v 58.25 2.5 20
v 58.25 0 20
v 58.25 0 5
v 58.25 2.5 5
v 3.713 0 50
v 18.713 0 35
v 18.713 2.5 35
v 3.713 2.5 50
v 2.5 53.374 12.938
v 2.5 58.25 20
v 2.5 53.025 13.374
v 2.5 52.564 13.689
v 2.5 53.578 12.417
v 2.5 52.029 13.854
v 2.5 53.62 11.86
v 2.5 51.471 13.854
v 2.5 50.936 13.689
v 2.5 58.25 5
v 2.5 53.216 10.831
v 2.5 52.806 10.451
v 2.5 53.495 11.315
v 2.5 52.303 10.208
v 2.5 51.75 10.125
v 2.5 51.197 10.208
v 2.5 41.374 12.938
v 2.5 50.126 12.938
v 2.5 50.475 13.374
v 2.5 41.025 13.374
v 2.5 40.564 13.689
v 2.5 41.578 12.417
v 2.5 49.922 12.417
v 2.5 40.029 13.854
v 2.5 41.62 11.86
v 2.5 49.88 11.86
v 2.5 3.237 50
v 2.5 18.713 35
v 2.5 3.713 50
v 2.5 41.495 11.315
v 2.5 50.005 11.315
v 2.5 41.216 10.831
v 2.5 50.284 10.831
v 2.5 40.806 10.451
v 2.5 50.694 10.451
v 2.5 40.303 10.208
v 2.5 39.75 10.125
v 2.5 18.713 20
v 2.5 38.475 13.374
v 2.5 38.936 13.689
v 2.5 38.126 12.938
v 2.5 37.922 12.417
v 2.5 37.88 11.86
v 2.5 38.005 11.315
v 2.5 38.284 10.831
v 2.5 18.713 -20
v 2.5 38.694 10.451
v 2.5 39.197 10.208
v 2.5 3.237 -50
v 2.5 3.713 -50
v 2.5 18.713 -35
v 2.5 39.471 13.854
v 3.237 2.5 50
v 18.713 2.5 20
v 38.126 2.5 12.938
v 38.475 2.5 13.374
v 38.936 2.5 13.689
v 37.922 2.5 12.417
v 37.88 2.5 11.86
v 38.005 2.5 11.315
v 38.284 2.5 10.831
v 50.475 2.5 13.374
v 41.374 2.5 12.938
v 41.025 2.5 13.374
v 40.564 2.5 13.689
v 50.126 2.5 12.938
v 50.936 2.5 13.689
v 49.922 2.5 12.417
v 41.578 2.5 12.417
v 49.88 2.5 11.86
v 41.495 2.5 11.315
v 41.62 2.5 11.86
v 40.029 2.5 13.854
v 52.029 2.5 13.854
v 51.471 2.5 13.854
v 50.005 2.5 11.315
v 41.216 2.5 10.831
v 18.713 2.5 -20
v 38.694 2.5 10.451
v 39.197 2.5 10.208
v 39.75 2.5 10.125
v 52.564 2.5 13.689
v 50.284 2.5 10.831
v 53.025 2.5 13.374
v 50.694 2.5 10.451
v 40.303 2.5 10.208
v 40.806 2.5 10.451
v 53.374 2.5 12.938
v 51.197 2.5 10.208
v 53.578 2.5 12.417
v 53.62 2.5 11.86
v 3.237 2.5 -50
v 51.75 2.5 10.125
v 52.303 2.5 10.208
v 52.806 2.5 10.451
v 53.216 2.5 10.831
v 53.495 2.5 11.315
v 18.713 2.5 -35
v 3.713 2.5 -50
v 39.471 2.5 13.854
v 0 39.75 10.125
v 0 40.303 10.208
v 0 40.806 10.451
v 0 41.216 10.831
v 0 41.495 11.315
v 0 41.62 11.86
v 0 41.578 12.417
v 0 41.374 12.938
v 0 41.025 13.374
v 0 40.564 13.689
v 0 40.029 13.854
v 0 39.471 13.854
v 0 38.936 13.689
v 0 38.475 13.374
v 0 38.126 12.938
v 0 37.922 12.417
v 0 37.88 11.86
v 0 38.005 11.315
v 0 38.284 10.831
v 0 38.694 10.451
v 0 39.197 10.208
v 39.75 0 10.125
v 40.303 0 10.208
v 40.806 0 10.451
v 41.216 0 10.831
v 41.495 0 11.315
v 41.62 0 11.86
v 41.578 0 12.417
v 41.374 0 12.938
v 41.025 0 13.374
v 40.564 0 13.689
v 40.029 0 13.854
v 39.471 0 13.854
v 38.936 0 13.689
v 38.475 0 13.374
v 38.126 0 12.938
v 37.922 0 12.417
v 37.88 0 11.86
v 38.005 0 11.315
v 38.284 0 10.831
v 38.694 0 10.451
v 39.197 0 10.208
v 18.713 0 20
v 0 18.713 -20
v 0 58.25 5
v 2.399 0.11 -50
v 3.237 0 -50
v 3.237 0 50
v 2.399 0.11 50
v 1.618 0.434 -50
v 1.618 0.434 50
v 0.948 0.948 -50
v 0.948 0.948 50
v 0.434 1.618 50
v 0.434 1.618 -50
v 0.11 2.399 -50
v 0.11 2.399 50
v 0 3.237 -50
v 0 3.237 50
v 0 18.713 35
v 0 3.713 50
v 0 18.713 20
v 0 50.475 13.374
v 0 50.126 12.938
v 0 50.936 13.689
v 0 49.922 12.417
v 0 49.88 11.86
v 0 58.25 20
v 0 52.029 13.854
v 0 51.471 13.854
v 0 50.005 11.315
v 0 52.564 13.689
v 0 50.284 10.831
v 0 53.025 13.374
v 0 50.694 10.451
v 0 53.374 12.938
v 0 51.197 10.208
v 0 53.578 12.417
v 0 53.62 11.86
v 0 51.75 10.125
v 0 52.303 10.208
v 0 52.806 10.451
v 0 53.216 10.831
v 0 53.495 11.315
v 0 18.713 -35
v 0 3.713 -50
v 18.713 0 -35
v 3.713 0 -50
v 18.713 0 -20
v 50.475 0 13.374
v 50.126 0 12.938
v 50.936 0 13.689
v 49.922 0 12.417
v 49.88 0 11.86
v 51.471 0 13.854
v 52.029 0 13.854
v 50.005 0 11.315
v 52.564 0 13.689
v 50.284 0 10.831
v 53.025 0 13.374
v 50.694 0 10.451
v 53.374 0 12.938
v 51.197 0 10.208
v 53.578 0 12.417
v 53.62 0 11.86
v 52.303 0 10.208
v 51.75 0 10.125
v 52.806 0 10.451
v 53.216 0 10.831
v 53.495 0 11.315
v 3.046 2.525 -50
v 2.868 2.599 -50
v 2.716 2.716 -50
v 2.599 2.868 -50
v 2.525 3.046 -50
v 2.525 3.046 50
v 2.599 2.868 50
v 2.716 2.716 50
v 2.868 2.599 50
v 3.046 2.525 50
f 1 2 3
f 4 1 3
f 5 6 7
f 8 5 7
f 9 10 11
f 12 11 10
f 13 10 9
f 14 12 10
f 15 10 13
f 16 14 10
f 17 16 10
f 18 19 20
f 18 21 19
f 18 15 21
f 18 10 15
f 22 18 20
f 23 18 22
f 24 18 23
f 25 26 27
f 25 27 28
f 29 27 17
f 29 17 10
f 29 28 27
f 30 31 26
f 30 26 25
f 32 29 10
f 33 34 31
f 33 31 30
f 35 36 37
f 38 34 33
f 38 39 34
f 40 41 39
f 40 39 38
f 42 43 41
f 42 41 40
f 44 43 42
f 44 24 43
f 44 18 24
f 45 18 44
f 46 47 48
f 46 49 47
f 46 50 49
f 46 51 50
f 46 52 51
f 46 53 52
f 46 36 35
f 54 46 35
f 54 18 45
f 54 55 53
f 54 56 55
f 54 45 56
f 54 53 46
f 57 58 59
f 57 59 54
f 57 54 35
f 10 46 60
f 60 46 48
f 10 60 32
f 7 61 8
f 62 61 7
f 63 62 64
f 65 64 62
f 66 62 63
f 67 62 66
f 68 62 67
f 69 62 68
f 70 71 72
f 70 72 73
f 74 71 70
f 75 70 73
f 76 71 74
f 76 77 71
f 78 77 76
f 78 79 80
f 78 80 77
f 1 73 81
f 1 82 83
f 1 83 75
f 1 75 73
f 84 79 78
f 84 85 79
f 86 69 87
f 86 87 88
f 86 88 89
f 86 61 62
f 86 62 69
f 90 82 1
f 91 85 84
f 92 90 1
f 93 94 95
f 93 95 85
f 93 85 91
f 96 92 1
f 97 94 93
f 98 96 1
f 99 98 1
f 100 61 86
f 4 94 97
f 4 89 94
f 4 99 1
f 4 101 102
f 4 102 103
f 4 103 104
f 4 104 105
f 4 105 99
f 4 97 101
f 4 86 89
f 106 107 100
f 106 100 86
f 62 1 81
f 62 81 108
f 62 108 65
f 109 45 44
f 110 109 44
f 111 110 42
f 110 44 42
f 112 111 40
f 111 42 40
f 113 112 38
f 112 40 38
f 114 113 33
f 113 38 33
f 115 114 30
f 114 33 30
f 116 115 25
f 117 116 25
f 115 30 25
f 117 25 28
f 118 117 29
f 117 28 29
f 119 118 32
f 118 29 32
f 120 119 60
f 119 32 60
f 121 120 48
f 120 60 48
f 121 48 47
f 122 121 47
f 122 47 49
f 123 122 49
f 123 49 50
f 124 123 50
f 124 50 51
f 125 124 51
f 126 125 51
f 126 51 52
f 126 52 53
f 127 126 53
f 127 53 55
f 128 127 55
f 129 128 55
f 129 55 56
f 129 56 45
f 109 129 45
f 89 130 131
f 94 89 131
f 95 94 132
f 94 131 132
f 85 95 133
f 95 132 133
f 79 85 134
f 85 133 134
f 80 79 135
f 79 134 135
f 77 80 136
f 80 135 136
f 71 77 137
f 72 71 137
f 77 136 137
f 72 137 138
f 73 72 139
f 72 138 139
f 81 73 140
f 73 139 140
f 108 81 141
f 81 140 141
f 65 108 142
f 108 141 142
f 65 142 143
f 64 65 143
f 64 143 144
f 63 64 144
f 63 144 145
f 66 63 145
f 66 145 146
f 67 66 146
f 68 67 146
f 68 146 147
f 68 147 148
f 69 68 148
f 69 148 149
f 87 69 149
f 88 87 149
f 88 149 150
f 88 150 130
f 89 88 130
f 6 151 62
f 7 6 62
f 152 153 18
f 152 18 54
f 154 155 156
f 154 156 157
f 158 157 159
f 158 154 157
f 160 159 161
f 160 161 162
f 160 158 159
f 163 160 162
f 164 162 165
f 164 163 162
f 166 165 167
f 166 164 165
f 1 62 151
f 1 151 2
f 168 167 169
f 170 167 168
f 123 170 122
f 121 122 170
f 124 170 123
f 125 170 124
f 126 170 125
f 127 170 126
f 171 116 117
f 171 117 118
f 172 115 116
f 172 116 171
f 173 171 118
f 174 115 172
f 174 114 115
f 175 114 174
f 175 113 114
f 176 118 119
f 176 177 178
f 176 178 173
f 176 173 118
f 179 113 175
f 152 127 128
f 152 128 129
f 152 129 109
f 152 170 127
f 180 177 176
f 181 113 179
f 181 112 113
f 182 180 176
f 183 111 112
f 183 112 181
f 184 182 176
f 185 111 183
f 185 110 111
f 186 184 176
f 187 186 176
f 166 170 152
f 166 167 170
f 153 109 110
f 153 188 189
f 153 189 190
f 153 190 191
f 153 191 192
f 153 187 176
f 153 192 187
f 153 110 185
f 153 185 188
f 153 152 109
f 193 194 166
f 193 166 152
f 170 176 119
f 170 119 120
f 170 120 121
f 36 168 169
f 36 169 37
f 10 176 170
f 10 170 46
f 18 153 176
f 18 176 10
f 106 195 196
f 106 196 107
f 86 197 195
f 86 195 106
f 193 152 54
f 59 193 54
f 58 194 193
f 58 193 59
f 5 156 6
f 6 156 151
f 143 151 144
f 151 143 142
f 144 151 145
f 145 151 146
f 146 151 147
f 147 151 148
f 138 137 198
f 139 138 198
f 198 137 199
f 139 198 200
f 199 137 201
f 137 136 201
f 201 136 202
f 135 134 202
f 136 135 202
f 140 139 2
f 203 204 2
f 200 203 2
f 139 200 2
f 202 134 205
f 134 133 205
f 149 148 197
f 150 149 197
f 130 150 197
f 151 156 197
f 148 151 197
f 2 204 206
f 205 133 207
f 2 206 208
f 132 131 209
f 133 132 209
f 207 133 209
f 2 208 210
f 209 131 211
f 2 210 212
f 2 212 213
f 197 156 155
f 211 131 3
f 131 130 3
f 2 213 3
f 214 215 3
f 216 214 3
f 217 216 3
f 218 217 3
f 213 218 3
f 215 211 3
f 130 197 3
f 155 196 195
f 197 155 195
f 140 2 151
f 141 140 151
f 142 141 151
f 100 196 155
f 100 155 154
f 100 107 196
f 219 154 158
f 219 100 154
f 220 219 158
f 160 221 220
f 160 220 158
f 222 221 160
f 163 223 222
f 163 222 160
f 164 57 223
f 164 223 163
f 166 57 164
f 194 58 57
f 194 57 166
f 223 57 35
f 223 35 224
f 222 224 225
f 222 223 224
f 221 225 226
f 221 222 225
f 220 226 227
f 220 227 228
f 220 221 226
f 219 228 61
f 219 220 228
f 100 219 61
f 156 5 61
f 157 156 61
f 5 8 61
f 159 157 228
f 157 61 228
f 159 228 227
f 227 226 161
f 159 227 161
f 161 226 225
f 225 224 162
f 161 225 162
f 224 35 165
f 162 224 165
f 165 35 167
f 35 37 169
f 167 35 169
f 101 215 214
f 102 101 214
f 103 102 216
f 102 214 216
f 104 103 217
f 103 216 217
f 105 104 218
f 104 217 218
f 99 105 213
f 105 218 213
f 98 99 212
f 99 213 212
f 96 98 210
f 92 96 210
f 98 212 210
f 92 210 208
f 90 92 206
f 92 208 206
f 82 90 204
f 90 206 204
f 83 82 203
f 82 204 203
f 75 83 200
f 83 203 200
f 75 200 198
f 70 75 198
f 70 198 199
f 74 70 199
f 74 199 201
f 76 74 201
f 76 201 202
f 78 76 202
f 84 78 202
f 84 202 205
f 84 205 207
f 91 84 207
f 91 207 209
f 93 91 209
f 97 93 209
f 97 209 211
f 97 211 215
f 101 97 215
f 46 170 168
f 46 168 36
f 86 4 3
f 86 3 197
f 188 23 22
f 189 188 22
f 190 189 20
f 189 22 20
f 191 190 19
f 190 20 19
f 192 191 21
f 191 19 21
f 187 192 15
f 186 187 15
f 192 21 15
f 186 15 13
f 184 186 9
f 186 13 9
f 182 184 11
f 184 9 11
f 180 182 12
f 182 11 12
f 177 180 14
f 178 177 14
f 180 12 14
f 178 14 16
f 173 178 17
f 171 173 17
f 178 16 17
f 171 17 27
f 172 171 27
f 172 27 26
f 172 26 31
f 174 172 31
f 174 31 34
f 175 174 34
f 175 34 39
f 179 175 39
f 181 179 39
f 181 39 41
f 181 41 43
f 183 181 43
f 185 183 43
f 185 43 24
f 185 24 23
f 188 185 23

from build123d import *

# Parameters (mm, degrees)
SKETCH1_W                    = 58.25
SKETCH1_H                    = 100
BASE_FLANGE1_DEPTH           = 2.5
EDGE_FLANGE1_STRIP_W         = 11.4732
EDGE_FLANGE1_STRIP_H         = 2.5
EDGE_FLANGE1_STRIP_CUT_DEPTH = 100
EDGE_FLANGE1_DEPTH           = 100
CUT_EXTRUDE1_START           = -30
CUT_EXTRUDE1_OUTLINE_W       = 2.5
CUT_EXTRUDE1_OUTLINE_H       = 39.536796564
CUT_EXTRUDE1_OUTLINE_W_2     = 39.536796564
CUT_EXTRUDE1_OUTLINE_H_2     = 2.5
CUT_EXTRUDE1_DEPTH           = 30
CUT_EXTRUDE2_REACH           = 98.365
SKETCH21_R                   = 1.875
CIRPATTERN1_COUNT            = 2
CIRPATTERN1_ANGLE            = 90
CUT_EXTRUDE3_REACH           = 98.365
CIRPATTERN2_COUNT            = 2
CIRPATTERN2_ANGLE            = 90
CHAMFER1_SIZE                = 15


# Read off the part's stored shape, not the designer's step: Cut-Extrude1
# Sheet-metal steps are written as plain solids
with BuildPart() as part:
    # Sketch1 → Base-Flange1 (new body)
    with BuildSketch(Plane(origin=(0, 0, 0), x_dir=(1, 0, 0), z_dir=(0, 1, 0))):
        with Locations((29.125, 0)):
            Rectangle(SKETCH1_W, SKETCH1_H)
    extrude(amount=BASE_FLANGE1_DEPTH)

    # Edge-Flange1 strip (across the edge) → Edge-Flange1 strip cut (cut)
    with BuildSketch(Plane(origin=(0, 2.5, -50), x_dir=(1, 0, 0), z_dir=(0, 0, 1))):
        with Locations((-2.5, -1.25)):
            Rectangle(EDGE_FLANGE1_STRIP_W, EDGE_FLANGE1_STRIP_H)
    extrude(amount=EDGE_FLANGE1_STRIP_CUT_DEPTH, mode=Mode.SUBTRACT)

    # Edge-Flange1 section (across the edge) → Edge-Flange1 (add)
    with BuildSketch(Plane(origin=(0, 2.5, -50), x_dir=(1, 0, 0), z_dir=(0, 0, 1))):
        with BuildLine():
            Line((0, 0.7366), (0, 55.75))
            Line((0, 55.75), (2.5, 55.75))
            Line((2.5, 55.75), (2.5, 0.7366))
            ThreePointArc((2.5, 0.7366), (2.715745145, 0.215745145), (3.2366, 0))
            Line((3.2366, 0), (3.2366, -2.5))
            ThreePointArc((3.2366, -2.5), (0.947978192, -1.552021808), (0, 0.7366))
        make_face()
    extrude(amount=EDGE_FLANGE1_DEPTH)

    # Cut-Extrude1 outline → Cut-Extrude1 (cut)
    with BuildSketch(Plane.XY.offset(50).offset(CUT_EXTRUDE1_START)):
        with Locations((1.25, 38.481601718)):
            Rectangle(CUT_EXTRUDE1_OUTLINE_W, CUT_EXTRUDE1_OUTLINE_H)
        with Locations((38.481601718, 1.25)):
            Rectangle(CUT_EXTRUDE1_OUTLINE_W_2, CUT_EXTRUDE1_OUTLINE_H_2)
    cut_extrude1 = extrude(amount=CUT_EXTRUDE1_DEPTH, mode=Mode.SUBTRACT)

    # Sketch21 → Cut-Extrude2 (cut, up to next)
    with BuildSketch(Plane.XZ, mode=Mode.PRIVATE) as cut_extrude2_sk1:
        with Locations(Location((51.75, 12, 0), (0, 0, 270))):
            Circle(SKETCH21_R)
    cut_extrude2_tool1 = extrude(cut_extrude2_sk1.sketch, amount=-CUT_EXTRUDE2_REACH, mode=Mode.PRIVATE) & part.part
    # Sketch21 → Cut-Extrude2 (cut, up to next)
    with BuildSketch(Plane.XZ, mode=Mode.PRIVATE) as cut_extrude2_sk2:
        with Locations(Location((39.75, 12, 0), (0, 0, 270))):
            Circle(SKETCH21_R)
    cut_extrude2_tool2 = extrude(cut_extrude2_sk2.sketch, amount=-CUT_EXTRUDE2_REACH, mode=Mode.PRIVATE) & part.part
    cut_extrude2_1 = cut_extrude2_tool1.solids().sort_by_distance((51.75, 0, 12))[0]
    add(cut_extrude2_1, mode=Mode.SUBTRACT)
    cut_extrude2_2 = cut_extrude2_tool2.solids().sort_by_distance((39.75, 0, 12))[0]
    add(cut_extrude2_2, mode=Mode.SUBTRACT)
    cut_extrude2 = cut_extrude2_1 + cut_extrude2_2  # Cut-Extrude2 as one shape, for the pattern or mirror that repeats it

    # CirPattern1: Cut-Extrude2; each copy of Cut-Extrude2 runs up to whatever stops it at its own place
    cirpattern1_before = part.part  # the part as the pattern finds it: every copy runs up to it
    cirpattern1_cut_extrude2_long1 = extrude(cut_extrude2_sk1.sketch, amount=-CUT_EXTRUDE2_REACH, mode=Mode.PRIVATE)
    cirpattern1_cut_extrude2_long2 = extrude(cut_extrude2_sk2.sketch, amount=-CUT_EXTRUDE2_REACH, mode=Mode.PRIVATE)
    cirpattern1_cut_extrude2_tool1_1 = cirpattern1_cut_extrude2_long1.rotate(Axis((3.2366, 3.2366, 0), (0, 0, 1)), 1 * CIRPATTERN1_ANGLE / (CIRPATTERN1_COUNT - 1)) & cirpattern1_before
    add(cirpattern1_cut_extrude2_tool1_1.solids().sort_by_distance((6.4732, 51.75, 12))[0], mode=Mode.SUBTRACT)
    cirpattern1_cut_extrude2_tool2_1 = cirpattern1_cut_extrude2_long2.rotate(Axis((3.2366, 3.2366, 0), (0, 0, 1)), 1 * CIRPATTERN1_ANGLE / (CIRPATTERN1_COUNT - 1)) & cirpattern1_before
    add(cirpattern1_cut_extrude2_tool2_1.solids().sort_by_distance((6.4732, 39.75, 12))[0], mode=Mode.SUBTRACT)

    # Mirror1: Cut-Extrude1 across plane
    add(cut_extrude1.mirror(Plane.XY), mode=Mode.SUBTRACT)

    # Sketch22 → Cut-Extrude3 (cut, up to next)
    with BuildSketch(Plane.ZY, mode=Mode.PRIVATE) as cut_extrude3_sk1:
        Polygon((-20, 18.713203436), (-20, 58.25), (5, 58.25), align=None)
    cut_extrude3_tool1 = extrude(cut_extrude3_sk1.sketch, amount=-CUT_EXTRUDE3_REACH, mode=Mode.PRIVATE) & part.part
    cut_extrude3 = cut_extrude3_tool1.solids().sort_by_distance((0, 45.071068, -11.666667))[0]
    add(cut_extrude3, mode=Mode.SUBTRACT)

    # CirPattern2: Cut-Extrude3; each copy of Cut-Extrude3 runs up to whatever stops it at its own place
    cirpattern2_before = part.part  # the part as the pattern finds it: every copy runs up to it
    cirpattern2_cut_extrude3_long = extrude(cut_extrude3_sk1.sketch, amount=-CUT_EXTRUDE3_REACH, mode=Mode.PRIVATE)
    cirpattern2_cut_extrude3_tool1 = cirpattern2_cut_extrude3_long.rotate(Axis((3.2366, 3.2366, 0), (0, 0, -1)), 1 * CIRPATTERN2_ANGLE / (CIRPATTERN2_COUNT - 1)) & cirpattern2_before
    add(cirpattern2_cut_extrude3_tool1.solids().sort_by_distance((45.071068, 6.4732, -11.666667))[0], mode=Mode.SUBTRACT)

    # Chamfer1
    chamfer1_edges = [part.edges().sort_by_distance(p)[0] for p in [
        (1.25, 18.713203436, -50),
        (18.713203436, 1.25, -50),
        (1.25, 18.713203436, 50),
        (18.713203436, 1.25, 50),
    ]]
    chamfer(chamfer1_edges, length=CHAMFER1_SIZE)


solid = part.part
